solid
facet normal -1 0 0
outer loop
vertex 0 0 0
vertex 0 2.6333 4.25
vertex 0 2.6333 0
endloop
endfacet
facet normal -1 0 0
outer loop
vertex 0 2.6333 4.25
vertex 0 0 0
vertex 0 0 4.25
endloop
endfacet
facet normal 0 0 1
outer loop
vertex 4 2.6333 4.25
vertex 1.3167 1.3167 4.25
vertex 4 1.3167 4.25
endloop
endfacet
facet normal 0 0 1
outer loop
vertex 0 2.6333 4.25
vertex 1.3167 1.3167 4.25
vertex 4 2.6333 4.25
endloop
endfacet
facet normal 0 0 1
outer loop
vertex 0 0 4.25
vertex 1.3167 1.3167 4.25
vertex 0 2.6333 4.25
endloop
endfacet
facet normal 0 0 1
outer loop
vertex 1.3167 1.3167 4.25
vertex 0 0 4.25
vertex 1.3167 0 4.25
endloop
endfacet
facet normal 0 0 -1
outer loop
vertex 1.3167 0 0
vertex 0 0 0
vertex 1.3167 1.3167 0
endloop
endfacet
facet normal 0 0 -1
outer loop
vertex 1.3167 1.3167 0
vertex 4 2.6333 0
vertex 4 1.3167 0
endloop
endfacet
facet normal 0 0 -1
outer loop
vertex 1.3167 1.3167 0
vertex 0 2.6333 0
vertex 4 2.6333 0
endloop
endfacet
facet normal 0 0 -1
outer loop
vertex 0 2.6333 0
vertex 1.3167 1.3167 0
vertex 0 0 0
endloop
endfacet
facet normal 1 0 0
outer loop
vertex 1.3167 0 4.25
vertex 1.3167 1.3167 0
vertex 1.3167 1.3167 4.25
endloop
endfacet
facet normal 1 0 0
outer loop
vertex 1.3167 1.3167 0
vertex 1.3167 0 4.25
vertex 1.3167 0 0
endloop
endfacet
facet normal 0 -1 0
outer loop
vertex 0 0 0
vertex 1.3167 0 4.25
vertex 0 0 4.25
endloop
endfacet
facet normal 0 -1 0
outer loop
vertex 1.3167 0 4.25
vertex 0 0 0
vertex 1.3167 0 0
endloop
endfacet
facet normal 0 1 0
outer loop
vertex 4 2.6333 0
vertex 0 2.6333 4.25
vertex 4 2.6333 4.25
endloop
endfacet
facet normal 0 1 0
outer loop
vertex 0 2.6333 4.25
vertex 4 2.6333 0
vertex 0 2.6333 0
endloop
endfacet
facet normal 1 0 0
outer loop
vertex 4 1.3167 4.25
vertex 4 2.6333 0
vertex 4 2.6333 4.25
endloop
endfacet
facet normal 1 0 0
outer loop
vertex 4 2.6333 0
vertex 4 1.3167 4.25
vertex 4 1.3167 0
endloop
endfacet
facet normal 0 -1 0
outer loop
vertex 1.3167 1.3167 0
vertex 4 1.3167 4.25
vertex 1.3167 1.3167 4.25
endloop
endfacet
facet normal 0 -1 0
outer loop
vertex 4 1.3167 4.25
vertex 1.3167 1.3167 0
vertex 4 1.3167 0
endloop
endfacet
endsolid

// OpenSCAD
// Generated by SolidPython 1.0.4 on 2020-12-18 11:25:16


translate(v = [4, 2.6333333333, 0]) {
	rotate(a = -180) {
		union() {
			translate(v = [2.6833333333, 0, 0]) {
				cube(size = [1.3166666667, 2.6333333333, 4.2500000000]);
			}
			cube(size = [4, 1.3166666667, 4.2500000000]);
		}
	}
}
